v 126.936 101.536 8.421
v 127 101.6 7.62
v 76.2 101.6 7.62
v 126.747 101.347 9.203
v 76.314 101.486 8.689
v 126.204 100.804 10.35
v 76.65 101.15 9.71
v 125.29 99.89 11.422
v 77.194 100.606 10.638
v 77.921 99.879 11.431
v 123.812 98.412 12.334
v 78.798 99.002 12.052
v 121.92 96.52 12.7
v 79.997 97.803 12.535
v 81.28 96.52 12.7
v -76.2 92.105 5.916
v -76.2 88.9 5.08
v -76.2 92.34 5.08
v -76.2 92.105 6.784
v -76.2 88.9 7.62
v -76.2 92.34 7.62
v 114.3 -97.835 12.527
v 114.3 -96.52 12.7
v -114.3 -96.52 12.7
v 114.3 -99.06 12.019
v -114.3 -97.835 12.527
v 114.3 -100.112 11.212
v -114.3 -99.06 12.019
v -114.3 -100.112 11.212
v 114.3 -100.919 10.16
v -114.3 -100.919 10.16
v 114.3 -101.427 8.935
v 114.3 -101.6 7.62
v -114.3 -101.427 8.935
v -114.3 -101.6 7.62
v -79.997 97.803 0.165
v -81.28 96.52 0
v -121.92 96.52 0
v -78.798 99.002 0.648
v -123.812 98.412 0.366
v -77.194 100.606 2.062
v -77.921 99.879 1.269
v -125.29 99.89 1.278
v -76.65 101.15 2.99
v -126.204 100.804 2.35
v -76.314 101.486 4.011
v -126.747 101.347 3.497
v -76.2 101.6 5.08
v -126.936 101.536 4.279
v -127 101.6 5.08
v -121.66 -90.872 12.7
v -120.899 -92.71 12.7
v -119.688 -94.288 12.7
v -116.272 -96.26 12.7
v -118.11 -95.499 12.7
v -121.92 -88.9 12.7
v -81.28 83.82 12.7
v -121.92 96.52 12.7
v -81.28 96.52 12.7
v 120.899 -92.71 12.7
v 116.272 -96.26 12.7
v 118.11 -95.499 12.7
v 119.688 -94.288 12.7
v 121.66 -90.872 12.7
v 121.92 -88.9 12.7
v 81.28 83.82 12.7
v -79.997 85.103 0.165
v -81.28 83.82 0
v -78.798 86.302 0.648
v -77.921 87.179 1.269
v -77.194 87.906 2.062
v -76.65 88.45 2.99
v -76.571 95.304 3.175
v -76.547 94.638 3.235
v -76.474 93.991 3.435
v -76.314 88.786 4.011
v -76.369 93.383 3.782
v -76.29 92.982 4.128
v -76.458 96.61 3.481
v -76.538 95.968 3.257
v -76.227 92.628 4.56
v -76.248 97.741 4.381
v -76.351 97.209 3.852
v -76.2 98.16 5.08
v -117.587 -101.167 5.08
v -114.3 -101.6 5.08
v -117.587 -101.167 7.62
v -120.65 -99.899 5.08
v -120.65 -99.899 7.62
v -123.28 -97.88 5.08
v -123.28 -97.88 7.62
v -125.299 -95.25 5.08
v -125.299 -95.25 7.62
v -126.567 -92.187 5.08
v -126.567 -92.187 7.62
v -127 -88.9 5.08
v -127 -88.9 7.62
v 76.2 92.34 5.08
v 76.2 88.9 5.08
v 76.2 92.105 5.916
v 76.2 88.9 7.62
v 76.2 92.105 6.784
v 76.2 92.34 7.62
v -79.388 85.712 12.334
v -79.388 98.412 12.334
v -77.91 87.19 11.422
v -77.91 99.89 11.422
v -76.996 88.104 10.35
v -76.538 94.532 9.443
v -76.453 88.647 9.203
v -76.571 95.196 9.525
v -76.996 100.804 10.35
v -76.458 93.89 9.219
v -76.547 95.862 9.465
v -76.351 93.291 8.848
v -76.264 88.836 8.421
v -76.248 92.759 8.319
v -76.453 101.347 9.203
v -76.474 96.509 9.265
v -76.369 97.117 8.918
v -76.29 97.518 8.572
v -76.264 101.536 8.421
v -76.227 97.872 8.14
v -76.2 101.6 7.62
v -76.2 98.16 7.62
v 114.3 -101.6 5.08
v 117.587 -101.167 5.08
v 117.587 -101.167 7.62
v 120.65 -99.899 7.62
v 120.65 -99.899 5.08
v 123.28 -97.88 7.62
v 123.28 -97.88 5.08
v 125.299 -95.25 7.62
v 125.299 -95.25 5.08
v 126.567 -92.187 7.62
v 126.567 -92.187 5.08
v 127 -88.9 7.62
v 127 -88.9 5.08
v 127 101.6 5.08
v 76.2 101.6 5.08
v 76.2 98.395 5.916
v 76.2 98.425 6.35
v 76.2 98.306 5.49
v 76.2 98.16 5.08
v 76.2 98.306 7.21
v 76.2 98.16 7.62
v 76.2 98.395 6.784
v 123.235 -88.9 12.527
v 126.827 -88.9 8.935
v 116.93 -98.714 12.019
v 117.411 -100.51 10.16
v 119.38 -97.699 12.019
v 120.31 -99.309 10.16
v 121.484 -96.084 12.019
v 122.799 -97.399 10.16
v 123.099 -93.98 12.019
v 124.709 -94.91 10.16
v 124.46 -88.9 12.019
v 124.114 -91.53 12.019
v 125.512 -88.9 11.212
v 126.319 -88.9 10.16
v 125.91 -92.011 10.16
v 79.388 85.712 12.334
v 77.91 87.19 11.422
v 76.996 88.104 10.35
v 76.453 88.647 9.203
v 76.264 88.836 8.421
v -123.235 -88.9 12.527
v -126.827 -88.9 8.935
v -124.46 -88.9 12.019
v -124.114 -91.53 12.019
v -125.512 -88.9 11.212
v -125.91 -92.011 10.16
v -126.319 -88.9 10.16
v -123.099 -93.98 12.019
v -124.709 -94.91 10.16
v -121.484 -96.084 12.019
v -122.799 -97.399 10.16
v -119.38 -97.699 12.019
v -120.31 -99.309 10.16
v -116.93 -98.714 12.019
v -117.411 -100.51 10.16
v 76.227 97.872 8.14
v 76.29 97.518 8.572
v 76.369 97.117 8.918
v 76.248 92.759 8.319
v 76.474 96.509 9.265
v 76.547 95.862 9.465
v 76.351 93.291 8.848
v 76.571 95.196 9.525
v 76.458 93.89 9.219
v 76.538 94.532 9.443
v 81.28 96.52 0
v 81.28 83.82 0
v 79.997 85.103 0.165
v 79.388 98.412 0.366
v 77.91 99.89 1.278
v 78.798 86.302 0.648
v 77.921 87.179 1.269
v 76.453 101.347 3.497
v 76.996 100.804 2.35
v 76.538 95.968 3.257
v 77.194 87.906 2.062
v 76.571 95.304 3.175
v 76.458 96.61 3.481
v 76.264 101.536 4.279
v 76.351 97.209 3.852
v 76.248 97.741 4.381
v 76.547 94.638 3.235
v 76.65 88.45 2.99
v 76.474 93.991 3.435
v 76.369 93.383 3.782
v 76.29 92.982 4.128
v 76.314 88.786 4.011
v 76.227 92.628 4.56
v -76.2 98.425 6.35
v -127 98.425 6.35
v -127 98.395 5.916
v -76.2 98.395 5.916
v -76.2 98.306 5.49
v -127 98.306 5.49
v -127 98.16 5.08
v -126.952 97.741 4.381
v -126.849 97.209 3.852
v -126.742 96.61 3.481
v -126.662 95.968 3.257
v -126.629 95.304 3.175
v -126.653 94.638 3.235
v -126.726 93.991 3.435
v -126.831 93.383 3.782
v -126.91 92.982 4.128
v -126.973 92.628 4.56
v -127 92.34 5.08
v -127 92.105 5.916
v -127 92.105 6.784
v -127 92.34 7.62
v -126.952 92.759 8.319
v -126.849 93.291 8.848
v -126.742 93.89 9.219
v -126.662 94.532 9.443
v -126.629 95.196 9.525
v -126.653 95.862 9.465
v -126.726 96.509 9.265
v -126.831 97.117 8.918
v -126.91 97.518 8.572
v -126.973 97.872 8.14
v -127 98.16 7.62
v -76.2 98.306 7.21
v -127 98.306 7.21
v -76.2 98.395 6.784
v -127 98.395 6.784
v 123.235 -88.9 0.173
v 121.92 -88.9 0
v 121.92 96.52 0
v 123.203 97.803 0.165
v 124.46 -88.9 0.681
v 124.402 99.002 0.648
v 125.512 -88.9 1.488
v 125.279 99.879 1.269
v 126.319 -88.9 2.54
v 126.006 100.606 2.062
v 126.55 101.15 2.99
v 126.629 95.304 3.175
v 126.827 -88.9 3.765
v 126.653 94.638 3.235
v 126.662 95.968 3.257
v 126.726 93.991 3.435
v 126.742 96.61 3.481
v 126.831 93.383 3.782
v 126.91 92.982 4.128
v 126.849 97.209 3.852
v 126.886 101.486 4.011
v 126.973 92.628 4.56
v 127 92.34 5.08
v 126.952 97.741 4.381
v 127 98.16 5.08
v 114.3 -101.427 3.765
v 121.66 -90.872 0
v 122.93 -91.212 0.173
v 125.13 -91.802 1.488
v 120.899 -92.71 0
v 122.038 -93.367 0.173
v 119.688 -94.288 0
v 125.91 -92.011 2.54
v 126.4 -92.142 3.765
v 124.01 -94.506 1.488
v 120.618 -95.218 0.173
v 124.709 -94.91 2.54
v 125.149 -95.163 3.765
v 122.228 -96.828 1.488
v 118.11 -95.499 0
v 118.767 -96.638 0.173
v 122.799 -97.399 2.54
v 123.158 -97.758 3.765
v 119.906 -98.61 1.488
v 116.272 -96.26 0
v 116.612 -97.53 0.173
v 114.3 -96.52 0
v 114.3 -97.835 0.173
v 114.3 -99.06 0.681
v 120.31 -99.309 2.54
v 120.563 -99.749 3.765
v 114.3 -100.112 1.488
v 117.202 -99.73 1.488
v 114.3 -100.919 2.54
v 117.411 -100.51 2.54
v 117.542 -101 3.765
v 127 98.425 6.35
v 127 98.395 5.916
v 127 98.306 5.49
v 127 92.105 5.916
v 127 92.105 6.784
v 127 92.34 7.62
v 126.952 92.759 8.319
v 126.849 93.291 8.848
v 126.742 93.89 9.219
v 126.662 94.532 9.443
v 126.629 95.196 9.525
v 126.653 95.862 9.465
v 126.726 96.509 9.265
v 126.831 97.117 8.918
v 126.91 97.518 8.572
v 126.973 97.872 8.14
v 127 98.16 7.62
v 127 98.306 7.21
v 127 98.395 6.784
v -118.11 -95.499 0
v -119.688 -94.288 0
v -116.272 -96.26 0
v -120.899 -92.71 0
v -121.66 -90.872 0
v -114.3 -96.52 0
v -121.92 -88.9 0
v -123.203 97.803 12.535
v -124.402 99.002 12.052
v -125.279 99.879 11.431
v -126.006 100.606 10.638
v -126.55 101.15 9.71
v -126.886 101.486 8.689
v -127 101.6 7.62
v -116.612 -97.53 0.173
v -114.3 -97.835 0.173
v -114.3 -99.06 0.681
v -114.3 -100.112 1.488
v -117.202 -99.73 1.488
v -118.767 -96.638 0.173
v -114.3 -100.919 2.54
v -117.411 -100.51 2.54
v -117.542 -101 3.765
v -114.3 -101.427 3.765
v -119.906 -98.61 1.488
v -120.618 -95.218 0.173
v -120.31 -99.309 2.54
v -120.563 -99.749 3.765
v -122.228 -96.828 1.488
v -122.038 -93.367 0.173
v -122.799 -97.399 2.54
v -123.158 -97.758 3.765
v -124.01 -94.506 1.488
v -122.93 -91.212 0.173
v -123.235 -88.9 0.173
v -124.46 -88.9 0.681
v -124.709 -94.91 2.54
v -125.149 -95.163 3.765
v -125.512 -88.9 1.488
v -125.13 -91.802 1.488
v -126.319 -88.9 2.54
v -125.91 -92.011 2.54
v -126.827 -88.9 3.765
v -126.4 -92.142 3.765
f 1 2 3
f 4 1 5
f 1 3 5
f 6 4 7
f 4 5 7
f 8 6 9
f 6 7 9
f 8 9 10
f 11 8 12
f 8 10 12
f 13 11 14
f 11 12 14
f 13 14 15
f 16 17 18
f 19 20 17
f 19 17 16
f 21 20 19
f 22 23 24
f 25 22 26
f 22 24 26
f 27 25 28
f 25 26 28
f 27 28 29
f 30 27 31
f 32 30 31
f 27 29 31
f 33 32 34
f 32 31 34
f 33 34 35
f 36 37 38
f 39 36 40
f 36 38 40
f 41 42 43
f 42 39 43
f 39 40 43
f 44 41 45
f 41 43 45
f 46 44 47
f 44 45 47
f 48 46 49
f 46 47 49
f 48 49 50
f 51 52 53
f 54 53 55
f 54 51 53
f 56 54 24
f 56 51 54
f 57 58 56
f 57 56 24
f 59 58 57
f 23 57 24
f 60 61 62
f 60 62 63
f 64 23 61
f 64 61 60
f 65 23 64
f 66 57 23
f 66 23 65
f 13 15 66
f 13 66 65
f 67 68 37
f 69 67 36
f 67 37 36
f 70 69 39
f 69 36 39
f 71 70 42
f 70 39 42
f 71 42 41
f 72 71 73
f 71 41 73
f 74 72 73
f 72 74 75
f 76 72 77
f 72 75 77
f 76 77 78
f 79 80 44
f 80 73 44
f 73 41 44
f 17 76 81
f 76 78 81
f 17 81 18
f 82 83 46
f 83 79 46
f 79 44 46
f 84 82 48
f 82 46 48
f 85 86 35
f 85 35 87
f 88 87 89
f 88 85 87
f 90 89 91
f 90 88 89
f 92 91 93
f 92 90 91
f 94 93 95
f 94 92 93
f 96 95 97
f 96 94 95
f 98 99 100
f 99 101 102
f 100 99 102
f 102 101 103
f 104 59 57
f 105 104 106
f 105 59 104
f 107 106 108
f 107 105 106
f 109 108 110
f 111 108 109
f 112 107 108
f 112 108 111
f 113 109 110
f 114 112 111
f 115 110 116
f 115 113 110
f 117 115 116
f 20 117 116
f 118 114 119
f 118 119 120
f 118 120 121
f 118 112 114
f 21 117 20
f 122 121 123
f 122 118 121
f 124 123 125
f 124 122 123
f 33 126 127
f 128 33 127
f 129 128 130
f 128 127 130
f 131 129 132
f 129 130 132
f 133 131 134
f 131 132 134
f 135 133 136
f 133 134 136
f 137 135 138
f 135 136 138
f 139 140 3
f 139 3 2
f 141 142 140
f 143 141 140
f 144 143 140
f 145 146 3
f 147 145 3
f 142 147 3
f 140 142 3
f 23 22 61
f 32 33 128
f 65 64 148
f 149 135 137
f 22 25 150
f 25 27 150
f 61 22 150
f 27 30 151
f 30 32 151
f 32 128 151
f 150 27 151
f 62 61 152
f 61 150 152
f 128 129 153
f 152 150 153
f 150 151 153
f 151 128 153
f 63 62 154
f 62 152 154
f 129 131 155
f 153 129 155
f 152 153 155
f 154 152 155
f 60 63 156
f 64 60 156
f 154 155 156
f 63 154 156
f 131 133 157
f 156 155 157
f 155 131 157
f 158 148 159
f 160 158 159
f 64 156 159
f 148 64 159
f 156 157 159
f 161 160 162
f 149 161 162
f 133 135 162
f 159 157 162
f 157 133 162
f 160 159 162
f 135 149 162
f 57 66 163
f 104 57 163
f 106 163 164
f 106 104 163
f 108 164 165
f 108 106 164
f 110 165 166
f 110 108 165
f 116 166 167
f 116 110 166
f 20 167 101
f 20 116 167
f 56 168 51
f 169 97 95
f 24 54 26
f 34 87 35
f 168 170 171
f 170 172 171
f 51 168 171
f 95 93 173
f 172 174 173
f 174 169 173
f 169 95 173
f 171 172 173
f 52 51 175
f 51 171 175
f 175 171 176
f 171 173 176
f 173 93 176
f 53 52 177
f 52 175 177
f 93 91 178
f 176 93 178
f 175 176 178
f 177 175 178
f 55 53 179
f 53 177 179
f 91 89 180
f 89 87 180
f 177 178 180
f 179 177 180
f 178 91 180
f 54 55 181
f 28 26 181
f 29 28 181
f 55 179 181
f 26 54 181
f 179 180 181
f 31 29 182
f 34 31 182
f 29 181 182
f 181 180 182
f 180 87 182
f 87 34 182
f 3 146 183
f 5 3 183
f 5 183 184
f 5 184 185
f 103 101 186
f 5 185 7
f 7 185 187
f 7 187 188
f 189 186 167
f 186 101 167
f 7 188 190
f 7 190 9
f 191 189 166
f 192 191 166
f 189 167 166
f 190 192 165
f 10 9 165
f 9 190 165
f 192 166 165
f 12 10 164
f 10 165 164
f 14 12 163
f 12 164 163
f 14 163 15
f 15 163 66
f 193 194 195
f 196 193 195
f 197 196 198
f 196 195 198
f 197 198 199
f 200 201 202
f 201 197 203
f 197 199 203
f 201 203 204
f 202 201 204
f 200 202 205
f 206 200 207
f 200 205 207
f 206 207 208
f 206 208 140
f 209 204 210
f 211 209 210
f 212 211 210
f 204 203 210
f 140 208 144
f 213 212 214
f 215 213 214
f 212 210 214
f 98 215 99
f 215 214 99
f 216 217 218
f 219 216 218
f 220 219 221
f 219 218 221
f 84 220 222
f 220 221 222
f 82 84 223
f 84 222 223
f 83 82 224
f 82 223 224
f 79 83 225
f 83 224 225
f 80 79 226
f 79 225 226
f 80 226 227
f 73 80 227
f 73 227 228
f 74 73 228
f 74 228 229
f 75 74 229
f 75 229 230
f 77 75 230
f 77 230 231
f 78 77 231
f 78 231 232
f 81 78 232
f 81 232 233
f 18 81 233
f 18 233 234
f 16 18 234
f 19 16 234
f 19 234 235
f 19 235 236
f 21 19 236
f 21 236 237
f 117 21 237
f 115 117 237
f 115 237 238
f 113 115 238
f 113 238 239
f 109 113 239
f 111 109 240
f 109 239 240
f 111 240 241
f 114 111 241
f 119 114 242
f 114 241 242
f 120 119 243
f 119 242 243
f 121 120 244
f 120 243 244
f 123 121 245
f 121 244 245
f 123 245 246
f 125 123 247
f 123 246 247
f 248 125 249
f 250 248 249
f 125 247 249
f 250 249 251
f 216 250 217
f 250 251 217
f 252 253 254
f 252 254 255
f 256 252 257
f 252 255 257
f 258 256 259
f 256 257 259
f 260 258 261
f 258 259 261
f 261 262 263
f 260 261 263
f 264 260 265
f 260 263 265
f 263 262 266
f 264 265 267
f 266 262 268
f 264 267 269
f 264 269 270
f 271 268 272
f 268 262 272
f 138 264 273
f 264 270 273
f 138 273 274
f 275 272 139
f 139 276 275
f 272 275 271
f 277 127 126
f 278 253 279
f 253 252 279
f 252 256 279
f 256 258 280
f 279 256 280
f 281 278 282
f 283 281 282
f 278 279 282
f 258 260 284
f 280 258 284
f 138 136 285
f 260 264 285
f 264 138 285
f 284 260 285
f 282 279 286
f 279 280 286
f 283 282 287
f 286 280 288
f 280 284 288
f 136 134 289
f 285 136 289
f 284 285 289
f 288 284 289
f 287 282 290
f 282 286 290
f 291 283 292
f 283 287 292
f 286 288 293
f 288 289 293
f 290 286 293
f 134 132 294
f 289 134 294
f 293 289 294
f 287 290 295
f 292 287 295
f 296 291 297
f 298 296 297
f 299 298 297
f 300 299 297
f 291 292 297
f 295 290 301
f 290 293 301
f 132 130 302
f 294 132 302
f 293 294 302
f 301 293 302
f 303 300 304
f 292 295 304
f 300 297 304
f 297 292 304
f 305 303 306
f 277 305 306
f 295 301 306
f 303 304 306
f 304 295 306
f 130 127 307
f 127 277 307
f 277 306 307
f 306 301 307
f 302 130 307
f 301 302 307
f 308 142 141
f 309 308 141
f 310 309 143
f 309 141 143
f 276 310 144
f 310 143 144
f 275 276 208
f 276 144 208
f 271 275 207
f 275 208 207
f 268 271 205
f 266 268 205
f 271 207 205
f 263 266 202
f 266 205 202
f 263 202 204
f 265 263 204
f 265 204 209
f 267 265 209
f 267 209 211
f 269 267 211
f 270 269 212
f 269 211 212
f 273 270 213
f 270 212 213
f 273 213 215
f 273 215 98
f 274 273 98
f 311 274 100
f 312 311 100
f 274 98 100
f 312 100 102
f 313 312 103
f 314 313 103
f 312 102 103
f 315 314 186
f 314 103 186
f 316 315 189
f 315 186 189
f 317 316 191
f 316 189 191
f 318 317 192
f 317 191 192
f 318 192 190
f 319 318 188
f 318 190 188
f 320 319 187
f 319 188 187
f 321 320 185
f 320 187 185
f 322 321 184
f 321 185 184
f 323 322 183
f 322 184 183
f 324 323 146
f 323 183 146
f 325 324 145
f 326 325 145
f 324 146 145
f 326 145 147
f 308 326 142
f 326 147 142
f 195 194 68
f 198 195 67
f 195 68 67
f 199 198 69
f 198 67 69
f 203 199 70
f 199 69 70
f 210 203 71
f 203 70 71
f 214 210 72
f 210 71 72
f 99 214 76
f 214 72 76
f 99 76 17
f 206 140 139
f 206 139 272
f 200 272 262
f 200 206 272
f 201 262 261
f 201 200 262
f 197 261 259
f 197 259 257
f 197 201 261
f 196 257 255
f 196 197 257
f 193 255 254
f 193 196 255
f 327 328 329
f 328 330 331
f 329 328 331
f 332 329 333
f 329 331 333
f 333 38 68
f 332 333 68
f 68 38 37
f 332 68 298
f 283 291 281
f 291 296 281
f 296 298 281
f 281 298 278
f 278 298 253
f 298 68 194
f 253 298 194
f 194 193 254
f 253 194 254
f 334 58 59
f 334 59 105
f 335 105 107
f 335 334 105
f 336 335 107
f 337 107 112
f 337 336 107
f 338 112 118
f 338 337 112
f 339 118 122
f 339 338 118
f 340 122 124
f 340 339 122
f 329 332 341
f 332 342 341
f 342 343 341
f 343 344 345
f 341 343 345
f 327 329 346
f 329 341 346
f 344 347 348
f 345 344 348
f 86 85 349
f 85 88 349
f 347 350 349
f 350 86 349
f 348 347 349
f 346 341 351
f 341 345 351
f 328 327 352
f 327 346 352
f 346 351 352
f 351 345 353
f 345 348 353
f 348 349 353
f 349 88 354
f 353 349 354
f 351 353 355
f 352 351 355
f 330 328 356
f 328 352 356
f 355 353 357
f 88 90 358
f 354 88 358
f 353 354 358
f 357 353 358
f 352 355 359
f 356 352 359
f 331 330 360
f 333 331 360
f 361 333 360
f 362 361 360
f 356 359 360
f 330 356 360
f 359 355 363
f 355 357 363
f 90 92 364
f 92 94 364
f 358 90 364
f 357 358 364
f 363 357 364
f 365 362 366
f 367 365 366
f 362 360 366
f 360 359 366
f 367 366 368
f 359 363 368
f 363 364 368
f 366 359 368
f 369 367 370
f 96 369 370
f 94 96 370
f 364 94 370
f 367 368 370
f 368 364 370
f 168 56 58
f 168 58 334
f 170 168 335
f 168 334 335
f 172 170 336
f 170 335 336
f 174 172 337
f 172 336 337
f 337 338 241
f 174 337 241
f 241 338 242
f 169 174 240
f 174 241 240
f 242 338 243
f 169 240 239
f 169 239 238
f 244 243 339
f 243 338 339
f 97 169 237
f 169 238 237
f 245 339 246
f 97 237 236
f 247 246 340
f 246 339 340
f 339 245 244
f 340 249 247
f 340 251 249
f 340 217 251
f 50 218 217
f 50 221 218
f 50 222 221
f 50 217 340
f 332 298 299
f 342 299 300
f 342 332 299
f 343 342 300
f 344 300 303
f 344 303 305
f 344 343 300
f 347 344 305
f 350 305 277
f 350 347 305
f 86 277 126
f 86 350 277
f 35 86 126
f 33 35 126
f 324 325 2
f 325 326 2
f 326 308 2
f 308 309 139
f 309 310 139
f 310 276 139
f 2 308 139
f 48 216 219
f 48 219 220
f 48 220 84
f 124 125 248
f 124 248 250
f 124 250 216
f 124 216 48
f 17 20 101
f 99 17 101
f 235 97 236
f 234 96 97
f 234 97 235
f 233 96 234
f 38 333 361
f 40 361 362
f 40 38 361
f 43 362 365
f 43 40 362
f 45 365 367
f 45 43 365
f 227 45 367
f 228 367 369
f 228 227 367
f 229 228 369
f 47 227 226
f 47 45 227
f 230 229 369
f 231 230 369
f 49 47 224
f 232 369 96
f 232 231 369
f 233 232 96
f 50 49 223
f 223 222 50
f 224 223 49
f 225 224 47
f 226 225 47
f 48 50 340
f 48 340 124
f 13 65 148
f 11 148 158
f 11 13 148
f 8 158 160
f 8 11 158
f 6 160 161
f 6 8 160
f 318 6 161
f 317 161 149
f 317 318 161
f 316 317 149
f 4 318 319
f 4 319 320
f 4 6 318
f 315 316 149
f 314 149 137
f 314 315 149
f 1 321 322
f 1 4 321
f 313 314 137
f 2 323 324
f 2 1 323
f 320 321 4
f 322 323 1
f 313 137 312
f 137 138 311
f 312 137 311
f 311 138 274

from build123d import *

# Parameters (mm, degrees)
F0_W         = 254
F0_H         = 203.2
F1_DEPTH     = 12.7
F4_DEPTH     = 254.001
F2_W         = 76.2
F2_H         = 12.7
F5_DEPTH     = 12.701
F6_T1_DEPTH  = 228.6
F6_T3_DEPTH  = 279.4
F6_T5_DEPTH  = 76.2
F6_T7_DEPTH  = 25.4
F6_T9_DEPTH  = 152.4
F6_T11_DEPTH = 76.2
F6_T17_DEPTH = 38.1
F6_T21_DEPTH = 165.1
F6_T28_DEPTH = 38.1
F6_T32_DEPTH = 165.1
F6_T39_DEPTH = 38.1
F6_T43_DEPTH = 165.1
F6_T50_DEPTH = 165.1
F6_T54_DEPTH = 38.1
F7_T1_DEPTH  = 12.7000000002
F7_T4_ANGLE  = 90
F7_T6_ANGLE  = 90
F7_T8_ANGLE  = 90
F7_T10_ANGLE = 90


# Not quite as in the source:
# - a fillet or chamfer that OpenCascade refuses, or shapes differently, is made with other operations: its cross-section is extruded or revolved along the edge and cut away or added


with BuildPart() as f1:
    # F0 (on Top) → F1 (new body)
    with BuildSketch(Plane.XY):
        Rectangle(F0_W, F0_H)
    extrude(amount=F1_DEPTH)

    # F3 (on face) → F4 (cut, through all)
    with BuildSketch(Plane(origin=(-127, 0, 0), x_dir=(0, -1, 0), z_dir=(-1, 0, 0))):
        with BuildLine():
            ThreePointArc((-92.075, 6.35), (-95.25, 9.525), (-98.425, 6.35))
            Line((-98.425, 6.35), (-92.075, 6.35))
        make_face()
        with BuildLine():
            Line((-92.075, 6.35), (-98.425, 6.35))
            ThreePointArc((-98.425, 6.35), (-95.25, 3.175), (-92.075, 6.35))
        make_face()
    extrude(amount=-F4_DEPTH, mode=Mode.SUBTRACT)

    # F2 (on face) → F5 (cut, through all)
    with BuildSketch(Plane.XY.offset(12.7)):
        with Locations((-38.1, 95.25)):
            Rectangle(F2_W, F2_H)
        with Locations((38.1, 95.25)):
            Rectangle(F2_W, F2_H)
    extrude(amount=-F5_DEPTH, mode=Mode.SUBTRACT)

    # F6: fillet of radius 5.08 on 16 edges, made by hand

    # F6_s2 → F6_t1 (cut)
    with BuildSketch(Plane.XZ.offset(-114.3)):
        with BuildLine():
            ThreePointArc((121.92, 12.7), (125.5121024484, 11.2121024484), (127, 7.62))
            Line((127, 7.62), (127, 12.7))
            Line((127, 12.7), (121.92, 12.7))
        make_face()
        with BuildLine():
            ThreePointArc((-121.92, 12.7), (-125.5121024484, 11.2121024484), (-127, 7.62))
            Line((-127, 7.62), (-127, 12.7))
            Line((-127, 12.7), (-121.92, 12.7))
        make_face()
        with BuildLine():
            ThreePointArc((121.92, 0), (125.5121024484, 1.4878975516), (127, 5.08))
            Line((127, 5.08), (127, 0))
            Line((127, 0), (121.92, 0))
        make_face()
        with BuildLine():
            ThreePointArc((-121.92, 0), (-125.5121024484, 1.4878975516), (-127, 5.08))
            Line((-127, 5.08), (-127, 0))
            Line((-127, 0), (-121.92, 0))
        make_face()
    extrude(amount=F6_T1_DEPTH, mode=Mode.SUBTRACT)

    # F6_s4 → F6_t3 (cut)
    with BuildSketch(Plane.YZ.offset(-139.7)):
        with BuildLine():
            ThreePointArc((-96.52, 12.7), (-100.1121024484, 11.2121024484), (-101.6, 7.62))
            Line((-101.6, 7.62), (-101.6, 12.7))
            Line((-101.6, 12.7), (-96.52, 12.7))
        make_face()
        with BuildLine():
            ThreePointArc((-96.52, 0), (-100.1121024484, 1.4878975516), (-101.6, 5.08))
            Line((-101.6, 5.08), (-101.6, 0))
            Line((-101.6, 0), (-96.52, 0))
        make_face()
    extrude(amount=F6_T3_DEPTH, mode=Mode.SUBTRACT)

    # F6_s6 → F6_t5 (cut)
    with BuildSketch(Plane.YZ.offset(-139.7)):
        with BuildLine():
            ThreePointArc((96.52, 12.7), (100.1121024484, 11.2121024484), (101.6, 7.62))
            Line((101.6, 7.62), (101.6, 12.7))
            Line((101.6, 12.7), (96.52, 12.7))
        make_face()
        with BuildLine():
            ThreePointArc((96.52, 0), (100.1121024484, 1.4878975516), (101.6, 5.08))
            Line((101.6, 5.08), (101.6, 0))
            Line((101.6, 0), (96.52, 0))
        make_face()
    extrude(amount=F6_T5_DEPTH, mode=Mode.SUBTRACT)

    # F6_s8 → F6_t7 (cut)
    with BuildSketch(Plane.XZ.offset(-114.3)):
        with BuildLine():
            ThreePointArc((-81.28, 12.7), (-77.6878975516, 11.2121024484), (-76.2, 7.62))
            Line((-76.2, 7.62), (-76.2, 12.7))
            Line((-76.2, 12.7), (-81.28, 12.7))
        make_face()
        with BuildLine():
            ThreePointArc((76.2, 7.62), (77.6878975516, 11.2121024484), (81.28, 12.7))
            Line((81.28, 12.7), (76.2, 12.7))
            Line((76.2, 12.7), (76.2, 7.62))
        make_face()
        with BuildLine():
            ThreePointArc((-81.28, 0), (-77.6878975516, 1.4878975516), (-76.2, 5.08))
            Line((-76.2, 5.08), (-76.2, 0))
            Line((-76.2, 0), (-81.28, 0))
        make_face()
        with BuildLine():
            ThreePointArc((81.28, 0), (77.6878975516, 1.4878975516), (76.2, 5.08))
            Line((76.2, 5.08), (76.2, 0))
            Line((76.2, 0), (81.28, 0))
        make_face()
    extrude(amount=F6_T7_DEPTH, mode=Mode.SUBTRACT)

    # F6_s10 → F6_t9 (cut)
    with BuildSketch(Plane.YZ.offset(-76.2)):
        with BuildLine():
            ThreePointArc((83.82, 12.7), (87.4121024484, 11.2121024484), (88.9, 7.62))
            Line((88.9, 7.62), (88.9, 12.7))
            Line((88.9, 12.7), (83.82, 12.7))
        make_face()
        with BuildLine():
            ThreePointArc((83.82, 0), (87.4121024484, 1.4878975516), (88.9, 5.08))
            Line((88.9, 5.08), (88.9, 0))
            Line((88.9, 0), (83.82, 0))
        make_face()
    extrude(amount=F6_T9_DEPTH, mode=Mode.SUBTRACT)

    # F6_s12 → F6_t11 (cut)
    with BuildSketch(Plane.YZ.offset(63.5)):
        with BuildLine():
            ThreePointArc((101.6, 7.62), (100.1121024484, 11.2121024484), (96.52, 12.7))
            Line((96.52, 12.7), (101.6, 12.7))
            Line((101.6, 12.7), (101.6, 7.62))
        make_face()
        with BuildLine():
            ThreePointArc((101.6, 5.08), (100.1121024484, 1.4878975516), (96.52, 0))
            Line((96.52, 0), (101.6, 0))
            Line((101.6, 0), (101.6, 5.08))
        make_face()
    extrude(amount=F6_T11_DEPTH, mode=Mode.SUBTRACT)


with BuildPart() as f6_tool15:
    # F6_s16 → F6_t17 (new body)
    with BuildSketch(Plane.XZ.offset(-114.3)):
        with BuildLine():
            ThreePointArc((-81.28, 12.7), (-77.6878975516, 11.2121024484), (-76.2, 7.62))
            Line((-76.2, 7.62), (-76.2, 12.7))
            Line((-76.2, 12.7), (-81.28, 12.7))
        make_face()
    extrude(amount=F6_T17_DEPTH)

    split(bisect_by=Plane.XZ.offset(-88.9), keep=Keep.TOP)


with BuildPart() as f6_tool19:
    # F6_s20 → F6_t21 (new body)
    with BuildSketch(Plane.YZ.offset(-88.9)):
        with BuildLine():
            ThreePointArc((83.82, 12.7), (87.4121024484, 11.2121024484), (88.9, 7.62))
            Line((88.9, 7.62), (88.9, 12.7))
            Line((88.9, 12.7), (83.82, 12.7))
        make_face()
    extrude(amount=F6_T21_DEPTH)

    split(bisect_by=Plane.YZ.offset(-76.2), keep=Keep.BOTTOM)


with BuildPart() as f6_tool15_1:
    add(f6_tool15.part)

    # F6_t23: intersect F6_tool19
    add(f6_tool19.part, mode=Mode.INTERSECT)


with BuildPart() as f1_1:
    add(f1.part)

    # F6_t13: cut F6_tool15
    add(f6_tool15_1.part, mode=Mode.SUBTRACT)


with BuildPart() as f6_tool26:
    # F6_s27 → F6_t28 (new body)
    with BuildSketch(Plane.XZ.offset(-76.2)):
        with BuildLine():
            ThreePointArc((76.2, 7.62), (77.6878975516, 11.2121024484), (81.28, 12.7))
            Line((81.28, 12.7), (76.2, 12.7))
            Line((76.2, 12.7), (76.2, 7.62))
        make_face()
    extrude(amount=-F6_T28_DEPTH)

    split(bisect_by=Plane.XZ.offset(-88.9), keep=Keep.TOP)


with BuildPart() as f6_tool30:
    # F6_s31 → F6_t32 (new body)
    with BuildSketch(Plane.YZ.offset(-76.2)):
        with BuildLine():
            ThreePointArc((83.82, 12.7), (87.4121024484, 11.2121024484), (88.9, 7.62))
            Line((88.9, 7.62), (88.9, 12.7))
            Line((88.9, 12.7), (83.82, 12.7))
        make_face()
    extrude(amount=F6_T32_DEPTH)

    split(bisect_by=Plane.YZ.offset(76.2), keep=Keep.TOP)


with BuildPart() as f6_tool26_1:
    add(f6_tool26.part)

    # F6_t34: intersect F6_tool30
    add(f6_tool30.part, mode=Mode.INTERSECT)


with BuildPart() as f1_2:
    add(f1_1.part)

    # F6_t24: cut F6_tool26
    add(f6_tool26_1.part, mode=Mode.SUBTRACT)


with BuildPart() as f6_tool37:
    # F6_s38 → F6_t39 (new body)
    with BuildSketch(Plane.XZ.offset(-114.3)):
        with BuildLine():
            ThreePointArc((-81.28, 0), (-77.6878975516, 1.4878975516), (-76.2, 5.08))
            Line((-76.2, 5.08), (-76.2, 0))
            Line((-76.2, 0), (-81.28, 0))
        make_face()
    extrude(amount=F6_T39_DEPTH)

    split(bisect_by=Plane.XZ.offset(-88.9), keep=Keep.TOP)


with BuildPart() as f6_tool41:
    # F6_s42 → F6_t43 (new body)
    with BuildSketch(Plane.YZ.offset(-88.9)):
        with BuildLine():
            ThreePointArc((83.82, 0), (87.4121024484, 1.4878975516), (88.9, 5.08))
            Line((88.9, 5.08), (88.9, 0))
            Line((88.9, 0), (83.82, 0))
        make_face()
    extrude(amount=F6_T43_DEPTH)

    split(bisect_by=Plane.YZ.offset(-76.2), keep=Keep.BOTTOM)


with BuildPart() as f6_tool37_1:
    add(f6_tool37.part)

    # F6_t45: intersect F6_tool41
    add(f6_tool41.part, mode=Mode.INTERSECT)


with BuildPart() as f1_3:
    add(f1_2.part)

    # F6_t35: cut F6_tool37
    add(f6_tool37_1.part, mode=Mode.SUBTRACT)


with BuildPart() as f6_tool48:
    # F6_s49 → F6_t50 (new body)
    with BuildSketch(Plane.YZ.offset(-76.2)):
        with BuildLine():
            ThreePointArc((83.82, 0), (87.4121024484, 1.4878975516), (88.9, 5.08))
            Line((88.9, 5.08), (88.9, 0))
            Line((88.9, 0), (83.82, 0))
        make_face()
    extrude(amount=F6_T50_DEPTH)

    split(bisect_by=Plane.YZ.offset(76.2), keep=Keep.TOP)


with BuildPart() as f6_tool52:
    # F6_s53 → F6_t54 (new body)
    with BuildSketch(Plane.XZ.offset(-76.2)):
        with BuildLine():
            ThreePointArc((81.28, 0), (77.6878975516, 1.4878975516), (76.2, 5.08))
            Line((76.2, 5.08), (76.2, 0))
            Line((76.2, 0), (81.28, 0))
        make_face()
    extrude(amount=-F6_T54_DEPTH)

    split(bisect_by=Plane.XZ.offset(-88.9), keep=Keep.TOP)


with BuildPart() as f6_tool48_1:
    add(f6_tool48.part)

    # F6_t56: intersect F6_tool52
    add(f6_tool52.part, mode=Mode.INTERSECT)


with BuildPart() as f1_4:
    add(f1_3.part)

    # F6_t46: cut F6_tool48
    add(f6_tool48_1.part, mode=Mode.SUBTRACT)

    # F7: fillet of radius 12.7 on 2 edges, made by hand

    # F7_s2 → F7_t1 (cut)
    with BuildSketch(Plane.XY):
        with BuildLine():
            ThreePointArc((-114.3, -101.6), (-123.2802561211, -97.8802561211), (-127, -88.9))
            Line((-127, -88.9), (-127, -101.6))
            Line((-127, -101.6), (-114.3, -101.6))
        make_face()
        with BuildLine():
            ThreePointArc((114.3, -101.6), (123.2802561211, -97.8802561211), (127, -88.9))
            Line((127, -88.9), (127, -101.6))
            Line((127, -101.6), (114.3, -101.6))
        make_face()
    extrude(amount=F7_T1_DEPTH, mode=Mode.SUBTRACT)

    # F7_s3 → F7_t4 (revolve, cut)
    with BuildSketch(Plane.XZ.offset(88.9)):
        with BuildLine():
            ThreePointArc((121.9199999999, 0), (125.5121024484, 1.4878975516), (127, 5.0800000001))
            Line((127, 5.0800000001), (127, 0))
            Line((127, 0), (121.9199999999, 0))
        make_face()
    revolve(axis=Axis((114.3, -88.9, 0), (0, 0, -1)), revolution_arc=F7_T4_ANGLE, mode=Mode.SUBTRACT)

    # F7_s5 → F7_t6 (revolve, cut)
    with BuildSketch(Plane.YZ.offset(114.3)):
        with BuildLine():
            ThreePointArc((-96.5199999999, 12.7), (-100.1121024484, 11.2121024484), (-101.6, 7.6199999999))
            Line((-101.6, 7.6199999999), (-101.6, 12.7))
            Line((-101.6, 12.7), (-96.5199999999, 12.7))
        make_face()
    revolve(axis=Axis((114.3, -88.9, 12.7), (0, 0, 1)), revolution_arc=F7_T6_ANGLE, mode=Mode.SUBTRACT)

    # F7_s7 → F7_t8 (revolve, cut)
    with BuildSketch(Plane.YZ.offset(-114.3)):
        with BuildLine():
            ThreePointArc((-96.5199999999, 0), (-100.1121024484, 1.4878975516), (-101.6, 5.0800000001))
            Line((-101.6, 5.0800000001), (-101.6, 0))
            Line((-101.6, 0), (-96.5199999999, 0))
        make_face()
    revolve(axis=Axis((-114.3, -88.9, 0), (0, 0, -1)), revolution_arc=F7_T8_ANGLE, mode=Mode.SUBTRACT)

    # F7_s9 → F7_t10 (revolve, cut)
    with BuildSketch(Plane.XZ.offset(88.9)):
        with BuildLine():
            ThreePointArc((-121.9199999999, 12.7), (-125.5121024484, 11.2121024484), (-127, 7.6199999999))
            Line((-127, 7.6199999999), (-127, 12.7))
            Line((-127, 12.7), (-121.9199999999, 12.7))
        make_face()
    revolve(axis=Axis((-114.3, -88.9, 12.7), (0, 0, 1)), revolution_arc=F7_T10_ANGLE, mode=Mode.SUBTRACT)


solid = f1_4.part
